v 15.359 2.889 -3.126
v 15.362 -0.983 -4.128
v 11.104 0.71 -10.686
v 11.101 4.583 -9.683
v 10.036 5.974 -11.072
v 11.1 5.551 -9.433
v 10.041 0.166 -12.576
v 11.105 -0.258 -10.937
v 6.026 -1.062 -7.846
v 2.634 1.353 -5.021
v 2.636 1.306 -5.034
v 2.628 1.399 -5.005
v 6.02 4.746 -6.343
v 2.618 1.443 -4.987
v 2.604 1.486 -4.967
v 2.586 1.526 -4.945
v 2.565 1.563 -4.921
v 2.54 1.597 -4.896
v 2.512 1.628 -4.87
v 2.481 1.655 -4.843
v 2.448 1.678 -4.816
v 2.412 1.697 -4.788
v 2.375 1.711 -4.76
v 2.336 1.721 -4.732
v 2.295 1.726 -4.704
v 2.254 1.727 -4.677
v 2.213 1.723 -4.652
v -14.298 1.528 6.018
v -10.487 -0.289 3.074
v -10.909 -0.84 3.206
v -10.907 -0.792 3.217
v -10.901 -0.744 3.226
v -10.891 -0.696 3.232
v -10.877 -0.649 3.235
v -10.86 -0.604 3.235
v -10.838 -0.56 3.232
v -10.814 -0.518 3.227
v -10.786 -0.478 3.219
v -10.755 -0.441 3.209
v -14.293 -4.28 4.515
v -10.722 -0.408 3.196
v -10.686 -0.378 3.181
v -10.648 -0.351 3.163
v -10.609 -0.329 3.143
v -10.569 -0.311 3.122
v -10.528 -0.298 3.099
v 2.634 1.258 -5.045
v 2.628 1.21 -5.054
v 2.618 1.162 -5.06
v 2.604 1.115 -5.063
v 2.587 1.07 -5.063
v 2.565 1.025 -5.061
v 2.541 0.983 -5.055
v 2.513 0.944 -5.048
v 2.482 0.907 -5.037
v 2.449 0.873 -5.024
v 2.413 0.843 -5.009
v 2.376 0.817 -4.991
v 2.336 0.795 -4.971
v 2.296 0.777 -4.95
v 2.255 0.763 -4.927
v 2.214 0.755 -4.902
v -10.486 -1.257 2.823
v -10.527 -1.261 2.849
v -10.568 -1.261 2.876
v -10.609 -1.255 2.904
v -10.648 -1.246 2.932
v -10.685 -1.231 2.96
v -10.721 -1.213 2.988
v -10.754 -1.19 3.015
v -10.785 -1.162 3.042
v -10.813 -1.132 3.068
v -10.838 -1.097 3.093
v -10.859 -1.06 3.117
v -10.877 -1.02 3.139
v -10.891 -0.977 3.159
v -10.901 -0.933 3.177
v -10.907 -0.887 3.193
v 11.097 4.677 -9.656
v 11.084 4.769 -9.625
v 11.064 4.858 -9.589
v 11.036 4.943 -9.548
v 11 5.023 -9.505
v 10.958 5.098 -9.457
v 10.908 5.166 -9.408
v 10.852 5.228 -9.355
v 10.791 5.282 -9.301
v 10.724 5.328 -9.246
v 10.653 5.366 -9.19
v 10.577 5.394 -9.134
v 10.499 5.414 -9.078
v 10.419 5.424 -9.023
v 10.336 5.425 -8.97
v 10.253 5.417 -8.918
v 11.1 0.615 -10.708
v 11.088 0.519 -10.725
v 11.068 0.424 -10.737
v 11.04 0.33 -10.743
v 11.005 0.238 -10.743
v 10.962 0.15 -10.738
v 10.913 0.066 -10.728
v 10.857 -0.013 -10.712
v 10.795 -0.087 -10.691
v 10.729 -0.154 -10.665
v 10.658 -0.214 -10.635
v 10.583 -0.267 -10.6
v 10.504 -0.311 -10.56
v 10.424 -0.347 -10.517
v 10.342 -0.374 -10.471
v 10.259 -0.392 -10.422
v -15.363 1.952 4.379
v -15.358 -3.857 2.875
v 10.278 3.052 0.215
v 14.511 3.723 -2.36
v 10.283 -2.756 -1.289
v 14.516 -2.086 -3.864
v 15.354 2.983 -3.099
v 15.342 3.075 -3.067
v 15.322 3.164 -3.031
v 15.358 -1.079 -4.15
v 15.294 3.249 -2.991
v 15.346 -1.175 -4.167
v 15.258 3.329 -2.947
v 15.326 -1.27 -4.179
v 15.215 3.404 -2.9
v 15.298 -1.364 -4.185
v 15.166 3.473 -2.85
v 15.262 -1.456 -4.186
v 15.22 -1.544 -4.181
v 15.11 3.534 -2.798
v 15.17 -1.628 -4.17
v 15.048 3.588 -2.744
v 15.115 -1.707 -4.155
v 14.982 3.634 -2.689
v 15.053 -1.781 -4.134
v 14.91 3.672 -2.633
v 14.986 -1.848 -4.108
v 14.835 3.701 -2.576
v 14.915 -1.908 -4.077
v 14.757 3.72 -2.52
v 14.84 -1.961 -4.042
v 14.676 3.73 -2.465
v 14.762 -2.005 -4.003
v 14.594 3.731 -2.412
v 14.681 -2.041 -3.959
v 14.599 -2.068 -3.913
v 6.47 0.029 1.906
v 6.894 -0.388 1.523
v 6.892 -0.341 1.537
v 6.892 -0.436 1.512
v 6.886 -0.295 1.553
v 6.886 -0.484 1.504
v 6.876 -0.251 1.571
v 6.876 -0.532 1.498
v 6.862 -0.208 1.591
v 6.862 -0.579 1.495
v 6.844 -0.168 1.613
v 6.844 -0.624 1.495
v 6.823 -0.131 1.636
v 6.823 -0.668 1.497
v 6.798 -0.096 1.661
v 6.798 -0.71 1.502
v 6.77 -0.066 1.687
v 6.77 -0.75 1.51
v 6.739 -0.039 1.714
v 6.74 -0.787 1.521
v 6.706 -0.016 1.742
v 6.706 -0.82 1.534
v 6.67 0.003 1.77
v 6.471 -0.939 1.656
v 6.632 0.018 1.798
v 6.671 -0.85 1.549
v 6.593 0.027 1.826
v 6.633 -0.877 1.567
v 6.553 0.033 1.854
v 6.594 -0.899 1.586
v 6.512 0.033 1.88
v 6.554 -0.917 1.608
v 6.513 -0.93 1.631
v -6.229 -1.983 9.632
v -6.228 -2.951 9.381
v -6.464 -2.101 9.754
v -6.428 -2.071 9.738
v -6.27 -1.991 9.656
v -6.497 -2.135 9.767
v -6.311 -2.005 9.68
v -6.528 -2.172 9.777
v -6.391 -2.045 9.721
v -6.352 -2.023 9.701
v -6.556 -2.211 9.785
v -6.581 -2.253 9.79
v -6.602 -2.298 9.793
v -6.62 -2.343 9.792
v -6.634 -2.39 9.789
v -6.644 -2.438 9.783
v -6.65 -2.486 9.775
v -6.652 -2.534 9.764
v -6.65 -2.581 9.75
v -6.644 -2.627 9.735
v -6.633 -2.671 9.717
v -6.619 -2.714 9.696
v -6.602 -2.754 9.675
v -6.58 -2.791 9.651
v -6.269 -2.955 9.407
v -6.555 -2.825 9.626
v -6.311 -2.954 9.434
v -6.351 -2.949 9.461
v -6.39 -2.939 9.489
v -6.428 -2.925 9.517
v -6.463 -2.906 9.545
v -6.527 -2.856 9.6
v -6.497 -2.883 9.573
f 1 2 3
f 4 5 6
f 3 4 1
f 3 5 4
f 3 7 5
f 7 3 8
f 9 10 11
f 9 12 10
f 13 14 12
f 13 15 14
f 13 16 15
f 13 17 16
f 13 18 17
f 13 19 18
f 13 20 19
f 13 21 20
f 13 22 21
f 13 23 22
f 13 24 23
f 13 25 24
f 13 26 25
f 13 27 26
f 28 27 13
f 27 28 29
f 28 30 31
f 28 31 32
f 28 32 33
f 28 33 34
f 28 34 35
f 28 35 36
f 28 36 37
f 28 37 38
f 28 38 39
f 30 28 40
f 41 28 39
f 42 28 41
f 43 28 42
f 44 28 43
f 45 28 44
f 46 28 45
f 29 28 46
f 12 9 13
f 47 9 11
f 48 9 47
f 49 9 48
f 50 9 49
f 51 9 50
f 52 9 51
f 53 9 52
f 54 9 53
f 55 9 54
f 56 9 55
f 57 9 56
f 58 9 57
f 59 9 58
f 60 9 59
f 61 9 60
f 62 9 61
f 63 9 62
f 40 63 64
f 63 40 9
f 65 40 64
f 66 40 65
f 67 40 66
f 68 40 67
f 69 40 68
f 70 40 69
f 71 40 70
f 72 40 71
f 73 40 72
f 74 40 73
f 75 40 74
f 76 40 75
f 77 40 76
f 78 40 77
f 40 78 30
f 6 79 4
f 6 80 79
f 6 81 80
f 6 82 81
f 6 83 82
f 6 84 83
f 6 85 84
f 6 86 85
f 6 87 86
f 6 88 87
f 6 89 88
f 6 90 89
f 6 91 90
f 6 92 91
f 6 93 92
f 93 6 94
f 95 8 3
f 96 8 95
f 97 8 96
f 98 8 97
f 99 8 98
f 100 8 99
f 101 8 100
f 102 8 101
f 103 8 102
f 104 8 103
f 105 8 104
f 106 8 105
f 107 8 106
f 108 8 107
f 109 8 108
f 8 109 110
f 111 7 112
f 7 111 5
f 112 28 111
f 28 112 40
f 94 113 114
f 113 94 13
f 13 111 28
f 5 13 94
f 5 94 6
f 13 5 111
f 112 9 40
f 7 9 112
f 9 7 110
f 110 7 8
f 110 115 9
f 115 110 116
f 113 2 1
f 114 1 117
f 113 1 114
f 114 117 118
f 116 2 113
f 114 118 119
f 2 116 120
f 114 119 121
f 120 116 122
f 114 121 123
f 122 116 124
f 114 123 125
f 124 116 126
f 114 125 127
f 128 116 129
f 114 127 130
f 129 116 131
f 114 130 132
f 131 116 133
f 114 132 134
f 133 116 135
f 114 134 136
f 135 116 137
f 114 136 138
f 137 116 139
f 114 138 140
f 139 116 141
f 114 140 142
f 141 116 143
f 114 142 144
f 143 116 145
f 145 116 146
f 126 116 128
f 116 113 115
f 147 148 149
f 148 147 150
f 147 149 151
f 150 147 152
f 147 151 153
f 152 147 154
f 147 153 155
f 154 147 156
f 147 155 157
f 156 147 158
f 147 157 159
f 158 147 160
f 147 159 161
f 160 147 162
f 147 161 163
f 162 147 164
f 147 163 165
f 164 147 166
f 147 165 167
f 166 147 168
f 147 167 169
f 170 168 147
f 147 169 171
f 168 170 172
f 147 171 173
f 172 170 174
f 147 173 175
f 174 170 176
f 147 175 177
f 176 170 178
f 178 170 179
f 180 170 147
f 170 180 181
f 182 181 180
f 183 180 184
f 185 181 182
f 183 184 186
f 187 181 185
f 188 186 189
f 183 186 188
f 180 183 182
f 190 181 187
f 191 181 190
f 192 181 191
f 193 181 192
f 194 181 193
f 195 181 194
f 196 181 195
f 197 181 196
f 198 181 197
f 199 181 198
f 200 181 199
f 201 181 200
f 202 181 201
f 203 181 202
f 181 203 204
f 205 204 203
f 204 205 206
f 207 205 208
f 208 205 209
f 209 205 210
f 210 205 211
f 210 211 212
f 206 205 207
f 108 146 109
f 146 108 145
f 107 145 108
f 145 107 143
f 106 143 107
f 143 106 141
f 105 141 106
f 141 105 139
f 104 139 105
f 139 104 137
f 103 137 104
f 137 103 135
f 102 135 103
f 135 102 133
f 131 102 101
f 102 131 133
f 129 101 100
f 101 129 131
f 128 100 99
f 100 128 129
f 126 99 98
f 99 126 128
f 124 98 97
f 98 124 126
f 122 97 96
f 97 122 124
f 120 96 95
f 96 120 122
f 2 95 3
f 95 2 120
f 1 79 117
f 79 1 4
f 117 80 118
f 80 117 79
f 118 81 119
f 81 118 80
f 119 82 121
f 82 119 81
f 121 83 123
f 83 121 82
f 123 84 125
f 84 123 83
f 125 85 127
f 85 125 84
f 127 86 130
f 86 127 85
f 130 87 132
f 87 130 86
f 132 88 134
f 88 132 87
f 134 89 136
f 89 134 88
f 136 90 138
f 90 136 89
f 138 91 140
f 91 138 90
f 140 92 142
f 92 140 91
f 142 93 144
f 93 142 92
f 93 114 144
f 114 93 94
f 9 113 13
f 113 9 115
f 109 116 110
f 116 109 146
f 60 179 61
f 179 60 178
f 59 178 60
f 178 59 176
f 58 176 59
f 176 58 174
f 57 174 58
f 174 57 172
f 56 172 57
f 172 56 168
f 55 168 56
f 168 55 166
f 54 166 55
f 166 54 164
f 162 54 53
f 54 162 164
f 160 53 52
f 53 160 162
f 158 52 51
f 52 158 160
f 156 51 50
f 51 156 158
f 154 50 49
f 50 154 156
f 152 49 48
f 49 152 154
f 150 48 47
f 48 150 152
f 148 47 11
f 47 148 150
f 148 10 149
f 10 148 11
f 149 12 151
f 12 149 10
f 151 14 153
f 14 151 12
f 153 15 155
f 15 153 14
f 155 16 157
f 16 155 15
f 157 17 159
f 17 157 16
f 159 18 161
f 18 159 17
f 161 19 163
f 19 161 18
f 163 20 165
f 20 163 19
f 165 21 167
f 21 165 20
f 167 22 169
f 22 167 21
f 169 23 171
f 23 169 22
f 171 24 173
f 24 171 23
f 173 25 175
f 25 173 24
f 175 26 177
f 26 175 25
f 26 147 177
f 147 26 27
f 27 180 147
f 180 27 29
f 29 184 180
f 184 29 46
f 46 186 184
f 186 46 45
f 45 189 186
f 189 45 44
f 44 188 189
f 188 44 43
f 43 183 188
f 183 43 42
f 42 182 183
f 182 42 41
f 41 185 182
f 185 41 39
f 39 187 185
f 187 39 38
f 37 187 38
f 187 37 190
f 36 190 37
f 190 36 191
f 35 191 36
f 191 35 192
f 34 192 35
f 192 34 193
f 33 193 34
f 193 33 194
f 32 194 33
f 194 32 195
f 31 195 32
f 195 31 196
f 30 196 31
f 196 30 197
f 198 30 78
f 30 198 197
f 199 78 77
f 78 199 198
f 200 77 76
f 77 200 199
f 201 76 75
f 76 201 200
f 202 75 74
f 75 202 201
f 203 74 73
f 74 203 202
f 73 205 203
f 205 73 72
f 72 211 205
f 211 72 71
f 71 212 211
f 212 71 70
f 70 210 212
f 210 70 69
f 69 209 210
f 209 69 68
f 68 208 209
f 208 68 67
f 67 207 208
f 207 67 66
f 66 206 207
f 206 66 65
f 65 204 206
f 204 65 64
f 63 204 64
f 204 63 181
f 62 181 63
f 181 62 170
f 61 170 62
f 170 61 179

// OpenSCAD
// file: stepped_bar.scad
// Lower bar is rectangular; the head's two free-end corners round above it.
// Rib x bounds are its OUTER stadium bounds, including both half-round ends.
$fn = 64;
body_length = 30;
body_width = 6;
head_length = 6;
step_1_height = 2;
step_2_height = 10;
corner_1_radius = 1;
corner_2_radius = 1;
corner_3_radius = 0.5;
corner_4_radius = 0.5;
rib_start = 4;
rib_end = 20;

module stepped_bar(body_length=30, body_width=6, head_length=6,
                    step_1_height=2, step_2_height=10,
                    corner_1_radius=1, corner_2_radius=1,
                    corner_3_radius=0.5, corner_4_radius=0.5,
                    rib_start=4, rib_end=20) {
    r1=corner_1_radius; r2=corner_2_radius;
    q1=corner_3_radius; q2=corner_4_radius;
    assert(0<step_1_height && step_1_height<step_2_height);
    assert(min(body_length,body_width,head_length,r1,r2,q1,q2)>0);
    assert(max(r1,r2)<min(head_length,body_width/2));
    assert(rib_start>0 && rib_end<body_length-head_length);
    assert(q1+q2<rib_end-rib_start && 2*max(q1,q2)<body_width);
    union() {
        cube([body_length,body_width,step_1_height]);
        translate([0,0,step_1_height]) linear_extrude(height=step_2_height-step_1_height) {
            // Head: square west end and rounded east end.
            hull() {
                translate([body_length-head_length,0]) square([head_length-max(r1,r2),body_width]);
                translate([body_length-r1,r1]) circle(r=r1);
                translate([body_length-r2,body_width-r2]) circle(r=r2);
            }
            // Stadium: centers one radius in from the specified outer bounds.
            hull() {
                translate([rib_start+q1,body_width/2]) circle(r=q1);
                translate([rib_end-q2,body_width/2]) circle(r=q2);
            }
        }
    }
}

stepped_bar(body_length,body_width,head_length,step_1_height,step_2_height,
    corner_1_radius,corner_2_radius,corner_3_radius,corner_4_radius,rib_start,rib_end);
// main file
use <stepped_bar.scad>
$fn = 64;
body_length = 30;
body_width = 6;
head_length = 6;
step_1_height = 2;
step_2_height = 10;
corner_1_radius = 1;
corner_2_radius = 1;
corner_3_radius = 0.5;
corner_4_radius = 0.5;
rib_start = 4;
rib_end = 20;

rotate([17,31,9]) translate([-body_length/2,-body_width/2,-step_2_height/2])
    stepped_bar(body_length,body_width,head_length,step_1_height,step_2_height,
        corner_1_radius,corner_2_radius,corner_3_radius,corner_4_radius,rib_start,rib_end);
